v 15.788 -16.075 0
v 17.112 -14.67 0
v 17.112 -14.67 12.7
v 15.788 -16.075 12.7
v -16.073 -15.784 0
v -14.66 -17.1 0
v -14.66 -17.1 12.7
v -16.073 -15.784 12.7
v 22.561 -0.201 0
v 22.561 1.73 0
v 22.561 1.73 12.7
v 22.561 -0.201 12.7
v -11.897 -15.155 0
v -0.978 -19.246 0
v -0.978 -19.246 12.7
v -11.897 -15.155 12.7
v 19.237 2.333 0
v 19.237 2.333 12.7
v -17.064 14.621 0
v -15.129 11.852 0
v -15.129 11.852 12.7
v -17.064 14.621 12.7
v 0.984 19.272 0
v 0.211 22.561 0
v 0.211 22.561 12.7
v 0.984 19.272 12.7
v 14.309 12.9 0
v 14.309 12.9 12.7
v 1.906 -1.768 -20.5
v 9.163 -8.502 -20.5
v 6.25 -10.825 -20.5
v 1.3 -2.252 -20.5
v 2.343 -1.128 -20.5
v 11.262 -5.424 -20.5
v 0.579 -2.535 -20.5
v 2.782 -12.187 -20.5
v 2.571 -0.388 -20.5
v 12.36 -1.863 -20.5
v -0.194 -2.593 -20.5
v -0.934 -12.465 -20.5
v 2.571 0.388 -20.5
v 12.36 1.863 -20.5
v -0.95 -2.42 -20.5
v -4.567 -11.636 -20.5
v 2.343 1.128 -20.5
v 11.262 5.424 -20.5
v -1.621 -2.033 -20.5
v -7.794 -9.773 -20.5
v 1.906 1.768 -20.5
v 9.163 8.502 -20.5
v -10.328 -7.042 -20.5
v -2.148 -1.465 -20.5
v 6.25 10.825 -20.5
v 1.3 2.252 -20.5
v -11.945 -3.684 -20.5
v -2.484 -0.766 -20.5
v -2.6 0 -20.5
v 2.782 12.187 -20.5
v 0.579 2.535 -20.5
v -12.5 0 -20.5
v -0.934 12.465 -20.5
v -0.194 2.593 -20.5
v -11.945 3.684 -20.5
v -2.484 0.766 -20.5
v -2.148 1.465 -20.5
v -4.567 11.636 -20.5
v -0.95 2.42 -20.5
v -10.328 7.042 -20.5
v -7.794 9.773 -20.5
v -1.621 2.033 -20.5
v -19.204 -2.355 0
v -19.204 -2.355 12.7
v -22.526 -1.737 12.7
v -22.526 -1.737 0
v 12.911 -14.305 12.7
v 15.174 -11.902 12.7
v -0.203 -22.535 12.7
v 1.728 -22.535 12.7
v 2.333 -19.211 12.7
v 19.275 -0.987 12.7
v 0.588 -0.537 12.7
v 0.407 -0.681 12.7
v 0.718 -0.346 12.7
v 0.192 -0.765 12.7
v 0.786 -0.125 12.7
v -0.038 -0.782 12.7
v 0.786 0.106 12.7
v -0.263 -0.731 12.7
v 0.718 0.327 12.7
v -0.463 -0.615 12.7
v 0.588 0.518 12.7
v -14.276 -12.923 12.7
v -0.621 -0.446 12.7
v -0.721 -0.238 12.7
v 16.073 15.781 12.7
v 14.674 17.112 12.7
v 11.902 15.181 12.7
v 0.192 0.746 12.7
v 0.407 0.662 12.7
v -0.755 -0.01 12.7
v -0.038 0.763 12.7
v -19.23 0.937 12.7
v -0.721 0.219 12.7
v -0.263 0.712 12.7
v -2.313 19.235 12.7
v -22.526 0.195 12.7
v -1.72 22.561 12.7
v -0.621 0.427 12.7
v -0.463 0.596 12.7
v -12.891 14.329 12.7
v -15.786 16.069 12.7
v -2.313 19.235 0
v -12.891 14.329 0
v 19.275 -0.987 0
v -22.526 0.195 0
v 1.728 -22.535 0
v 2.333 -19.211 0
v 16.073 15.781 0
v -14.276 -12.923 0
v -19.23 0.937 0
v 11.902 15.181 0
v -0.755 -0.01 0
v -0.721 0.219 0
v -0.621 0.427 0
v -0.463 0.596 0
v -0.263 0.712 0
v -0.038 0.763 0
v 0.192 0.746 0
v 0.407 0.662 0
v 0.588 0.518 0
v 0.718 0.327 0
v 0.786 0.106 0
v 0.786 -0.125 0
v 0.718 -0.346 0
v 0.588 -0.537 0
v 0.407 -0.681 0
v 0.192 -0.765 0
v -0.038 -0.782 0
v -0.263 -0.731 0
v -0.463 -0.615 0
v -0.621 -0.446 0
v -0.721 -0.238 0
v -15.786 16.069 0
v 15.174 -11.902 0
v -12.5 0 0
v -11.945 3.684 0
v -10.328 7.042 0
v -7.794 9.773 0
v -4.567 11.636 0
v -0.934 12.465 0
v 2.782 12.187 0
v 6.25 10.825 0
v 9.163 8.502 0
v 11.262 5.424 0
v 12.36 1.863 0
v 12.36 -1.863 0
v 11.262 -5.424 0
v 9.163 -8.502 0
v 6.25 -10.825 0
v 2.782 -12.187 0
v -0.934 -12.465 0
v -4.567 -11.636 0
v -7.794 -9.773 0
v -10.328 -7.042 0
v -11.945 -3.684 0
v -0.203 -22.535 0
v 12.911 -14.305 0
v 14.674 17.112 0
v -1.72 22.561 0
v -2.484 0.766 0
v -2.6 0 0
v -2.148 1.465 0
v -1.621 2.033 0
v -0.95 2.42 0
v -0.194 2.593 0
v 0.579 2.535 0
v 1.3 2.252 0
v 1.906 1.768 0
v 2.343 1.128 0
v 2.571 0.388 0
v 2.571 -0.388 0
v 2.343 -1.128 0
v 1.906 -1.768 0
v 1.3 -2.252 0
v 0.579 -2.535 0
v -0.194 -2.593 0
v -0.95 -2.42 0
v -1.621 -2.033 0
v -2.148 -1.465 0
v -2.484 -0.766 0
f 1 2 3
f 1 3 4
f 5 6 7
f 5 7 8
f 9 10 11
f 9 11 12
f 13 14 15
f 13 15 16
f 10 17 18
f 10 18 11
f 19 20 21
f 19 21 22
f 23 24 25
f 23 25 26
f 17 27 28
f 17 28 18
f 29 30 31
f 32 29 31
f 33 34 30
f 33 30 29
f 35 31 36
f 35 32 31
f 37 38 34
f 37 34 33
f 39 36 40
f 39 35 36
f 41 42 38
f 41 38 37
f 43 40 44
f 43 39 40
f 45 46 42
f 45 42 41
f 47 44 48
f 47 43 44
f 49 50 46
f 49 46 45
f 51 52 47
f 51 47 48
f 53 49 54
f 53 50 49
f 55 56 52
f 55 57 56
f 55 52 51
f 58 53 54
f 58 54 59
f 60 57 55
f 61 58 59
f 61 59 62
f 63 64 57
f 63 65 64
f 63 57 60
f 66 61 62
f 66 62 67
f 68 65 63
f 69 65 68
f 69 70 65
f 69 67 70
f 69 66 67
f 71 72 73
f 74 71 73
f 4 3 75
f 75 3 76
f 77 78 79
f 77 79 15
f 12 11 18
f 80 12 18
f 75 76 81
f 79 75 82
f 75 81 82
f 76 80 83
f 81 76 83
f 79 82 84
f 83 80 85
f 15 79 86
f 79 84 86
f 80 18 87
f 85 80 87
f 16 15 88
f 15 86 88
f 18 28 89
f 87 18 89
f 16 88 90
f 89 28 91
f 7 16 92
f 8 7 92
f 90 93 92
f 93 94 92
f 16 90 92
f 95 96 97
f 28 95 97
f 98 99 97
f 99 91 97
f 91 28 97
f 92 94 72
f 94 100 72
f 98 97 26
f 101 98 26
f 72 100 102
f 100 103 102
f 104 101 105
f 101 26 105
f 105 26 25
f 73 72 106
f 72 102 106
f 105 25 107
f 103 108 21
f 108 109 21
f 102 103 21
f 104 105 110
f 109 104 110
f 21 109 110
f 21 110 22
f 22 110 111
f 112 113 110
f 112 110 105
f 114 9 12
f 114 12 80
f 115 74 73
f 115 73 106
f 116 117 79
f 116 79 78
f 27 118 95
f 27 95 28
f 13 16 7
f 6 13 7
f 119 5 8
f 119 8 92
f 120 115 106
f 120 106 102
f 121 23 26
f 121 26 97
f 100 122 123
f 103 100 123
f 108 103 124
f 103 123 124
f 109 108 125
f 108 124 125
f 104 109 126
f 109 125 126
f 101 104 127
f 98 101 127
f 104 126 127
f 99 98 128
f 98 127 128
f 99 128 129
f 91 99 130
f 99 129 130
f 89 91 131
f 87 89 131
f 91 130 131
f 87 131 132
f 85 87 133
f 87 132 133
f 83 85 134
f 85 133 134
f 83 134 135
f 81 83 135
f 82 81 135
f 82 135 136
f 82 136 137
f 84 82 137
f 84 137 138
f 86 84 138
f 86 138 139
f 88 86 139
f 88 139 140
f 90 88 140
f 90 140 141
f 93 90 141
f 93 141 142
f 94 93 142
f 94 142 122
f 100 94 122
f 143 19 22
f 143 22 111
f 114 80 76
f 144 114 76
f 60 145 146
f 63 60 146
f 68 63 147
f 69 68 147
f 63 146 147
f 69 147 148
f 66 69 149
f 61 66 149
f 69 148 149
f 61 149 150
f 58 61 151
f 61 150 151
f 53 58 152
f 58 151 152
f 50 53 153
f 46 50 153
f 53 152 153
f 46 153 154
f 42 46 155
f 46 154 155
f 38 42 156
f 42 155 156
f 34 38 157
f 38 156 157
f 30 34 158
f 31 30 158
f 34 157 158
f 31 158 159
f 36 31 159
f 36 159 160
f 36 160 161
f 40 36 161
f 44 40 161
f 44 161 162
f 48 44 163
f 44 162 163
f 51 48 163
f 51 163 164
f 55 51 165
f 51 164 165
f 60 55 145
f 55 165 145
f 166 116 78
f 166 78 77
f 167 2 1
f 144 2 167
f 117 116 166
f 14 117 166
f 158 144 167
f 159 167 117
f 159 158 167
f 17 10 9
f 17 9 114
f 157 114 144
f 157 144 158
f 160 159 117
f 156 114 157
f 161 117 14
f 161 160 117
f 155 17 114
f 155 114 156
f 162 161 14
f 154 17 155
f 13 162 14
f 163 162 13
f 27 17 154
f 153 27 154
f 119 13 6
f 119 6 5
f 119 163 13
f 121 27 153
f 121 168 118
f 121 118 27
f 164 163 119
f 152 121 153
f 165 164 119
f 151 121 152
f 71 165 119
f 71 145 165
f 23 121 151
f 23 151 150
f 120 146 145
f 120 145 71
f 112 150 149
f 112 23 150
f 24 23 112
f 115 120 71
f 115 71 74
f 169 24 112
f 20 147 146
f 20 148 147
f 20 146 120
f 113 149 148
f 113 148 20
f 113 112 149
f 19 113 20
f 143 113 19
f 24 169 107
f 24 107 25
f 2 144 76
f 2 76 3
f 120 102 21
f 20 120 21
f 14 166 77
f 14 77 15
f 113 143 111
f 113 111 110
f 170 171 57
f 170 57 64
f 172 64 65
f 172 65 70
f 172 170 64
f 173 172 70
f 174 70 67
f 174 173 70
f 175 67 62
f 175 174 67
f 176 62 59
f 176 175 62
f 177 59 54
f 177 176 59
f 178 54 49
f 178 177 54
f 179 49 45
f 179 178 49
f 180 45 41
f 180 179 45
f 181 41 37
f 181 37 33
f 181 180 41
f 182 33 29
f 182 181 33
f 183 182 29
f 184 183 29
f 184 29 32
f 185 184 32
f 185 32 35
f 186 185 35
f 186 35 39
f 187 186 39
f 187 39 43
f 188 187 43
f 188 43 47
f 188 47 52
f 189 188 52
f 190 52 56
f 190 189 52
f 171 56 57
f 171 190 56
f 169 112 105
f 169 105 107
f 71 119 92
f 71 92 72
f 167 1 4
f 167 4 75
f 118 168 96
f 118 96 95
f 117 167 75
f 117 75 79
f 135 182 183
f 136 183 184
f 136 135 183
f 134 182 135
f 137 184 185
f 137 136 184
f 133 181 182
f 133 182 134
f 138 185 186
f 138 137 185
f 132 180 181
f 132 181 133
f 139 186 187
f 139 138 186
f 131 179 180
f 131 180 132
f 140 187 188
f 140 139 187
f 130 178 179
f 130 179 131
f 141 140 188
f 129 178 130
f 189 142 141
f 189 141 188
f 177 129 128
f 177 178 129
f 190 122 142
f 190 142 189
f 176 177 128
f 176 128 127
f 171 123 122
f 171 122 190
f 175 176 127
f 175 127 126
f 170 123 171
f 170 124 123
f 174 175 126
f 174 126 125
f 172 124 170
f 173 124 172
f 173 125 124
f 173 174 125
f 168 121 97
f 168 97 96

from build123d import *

# Parameters (mm, degrees)
BOSS_EXTRUDE1_DEPTH = 12.7
CUT_EXTRUDE1_REACH  = 14.7
SKETCH2_R           = 0.775
SKETCH4_R           = 12.5
SKETCH4_R_2         = 2.6
BOSS_EXTRUDE3_DEPTH = 20.5


with BuildPart() as part:
    # Sketch1 → Boss-Extrude1 (new body)
    with BuildSketch(Plane(origin=(0, 0, 0), x_dir=(-1, 0, 0), z_dir=(0, 0, -1))):
        Polygon((22.52557458, -1.736588639), (22.52557458, 0.194536921), (19.229808022, 0.93665661), (15.128723263, 11.851737372), (17.063649078, 14.621011813), (15.786423571, 16.069438867), (12.890863827, 14.329165151), (2.313040546, 19.235032954), (1.719665356, 22.560799741), (-0.211460204, 22.560799741), (-0.98374926, 19.271971918), (-11.902473648, 15.180597821), (-14.673902719, 17.112436257), (-16.073066924, 15.781427071), (-14.308800518, 12.900423272), (-19.236913758, 2.332945609), (-22.560976284, 1.730096406), (-22.560976284, -0.201029153), (-19.275488766, -0.987407309), (-15.174404006, -11.902488071), (-17.112216048, -14.669743631), (-15.788139908, -16.075470597), (-12.910837913, -14.305173427), (-2.333014633, -19.21104123), (-1.727718406, -22.534659035), (0.203407153, -22.534659035), (0.978499423, -19.246490729), (11.89722381, -15.155116632), (14.659649692, -17.099807376), (16.072878525, -15.783741196), (14.276312796, -12.922767512), (19.204426036, -2.355289849), align=None)
    extrude(amount=-BOSS_EXTRUDE1_DEPTH)

    # Sketch2 → Cut-Extrude1 (cut, up to next)
    with BuildSketch(Plane(origin=(0, 0, 0), x_dir=(-1, 0, 0), z_dir=(0, 0, -1)), mode=Mode.PRIVATE) as cut_extrude1_sk1:
        with Locations((-0.019773646, -0.00956531)):
            Circle(SKETCH2_R)
    cut_extrude1_tool1 = extrude(cut_extrude1_sk1.sketch, amount=-CUT_EXTRUDE1_REACH, mode=Mode.PRIVATE) & part.part
    add(cut_extrude1_tool1.solids().sort_by_distance((0.019774, -0.009565, 0))[0], mode=Mode.SUBTRACT)

    # Sketch4 → Boss-Extrude3 (add)
    with BuildSketch(Plane(origin=(0, 0, 0), x_dir=(-1, 0, 0), z_dir=(0, 0, -1))):
        Circle(SKETCH4_R)
        Circle(SKETCH4_R_2, mode=Mode.SUBTRACT)
    extrude(amount=BOSS_EXTRUDE3_DEPTH)


solid = part.part
